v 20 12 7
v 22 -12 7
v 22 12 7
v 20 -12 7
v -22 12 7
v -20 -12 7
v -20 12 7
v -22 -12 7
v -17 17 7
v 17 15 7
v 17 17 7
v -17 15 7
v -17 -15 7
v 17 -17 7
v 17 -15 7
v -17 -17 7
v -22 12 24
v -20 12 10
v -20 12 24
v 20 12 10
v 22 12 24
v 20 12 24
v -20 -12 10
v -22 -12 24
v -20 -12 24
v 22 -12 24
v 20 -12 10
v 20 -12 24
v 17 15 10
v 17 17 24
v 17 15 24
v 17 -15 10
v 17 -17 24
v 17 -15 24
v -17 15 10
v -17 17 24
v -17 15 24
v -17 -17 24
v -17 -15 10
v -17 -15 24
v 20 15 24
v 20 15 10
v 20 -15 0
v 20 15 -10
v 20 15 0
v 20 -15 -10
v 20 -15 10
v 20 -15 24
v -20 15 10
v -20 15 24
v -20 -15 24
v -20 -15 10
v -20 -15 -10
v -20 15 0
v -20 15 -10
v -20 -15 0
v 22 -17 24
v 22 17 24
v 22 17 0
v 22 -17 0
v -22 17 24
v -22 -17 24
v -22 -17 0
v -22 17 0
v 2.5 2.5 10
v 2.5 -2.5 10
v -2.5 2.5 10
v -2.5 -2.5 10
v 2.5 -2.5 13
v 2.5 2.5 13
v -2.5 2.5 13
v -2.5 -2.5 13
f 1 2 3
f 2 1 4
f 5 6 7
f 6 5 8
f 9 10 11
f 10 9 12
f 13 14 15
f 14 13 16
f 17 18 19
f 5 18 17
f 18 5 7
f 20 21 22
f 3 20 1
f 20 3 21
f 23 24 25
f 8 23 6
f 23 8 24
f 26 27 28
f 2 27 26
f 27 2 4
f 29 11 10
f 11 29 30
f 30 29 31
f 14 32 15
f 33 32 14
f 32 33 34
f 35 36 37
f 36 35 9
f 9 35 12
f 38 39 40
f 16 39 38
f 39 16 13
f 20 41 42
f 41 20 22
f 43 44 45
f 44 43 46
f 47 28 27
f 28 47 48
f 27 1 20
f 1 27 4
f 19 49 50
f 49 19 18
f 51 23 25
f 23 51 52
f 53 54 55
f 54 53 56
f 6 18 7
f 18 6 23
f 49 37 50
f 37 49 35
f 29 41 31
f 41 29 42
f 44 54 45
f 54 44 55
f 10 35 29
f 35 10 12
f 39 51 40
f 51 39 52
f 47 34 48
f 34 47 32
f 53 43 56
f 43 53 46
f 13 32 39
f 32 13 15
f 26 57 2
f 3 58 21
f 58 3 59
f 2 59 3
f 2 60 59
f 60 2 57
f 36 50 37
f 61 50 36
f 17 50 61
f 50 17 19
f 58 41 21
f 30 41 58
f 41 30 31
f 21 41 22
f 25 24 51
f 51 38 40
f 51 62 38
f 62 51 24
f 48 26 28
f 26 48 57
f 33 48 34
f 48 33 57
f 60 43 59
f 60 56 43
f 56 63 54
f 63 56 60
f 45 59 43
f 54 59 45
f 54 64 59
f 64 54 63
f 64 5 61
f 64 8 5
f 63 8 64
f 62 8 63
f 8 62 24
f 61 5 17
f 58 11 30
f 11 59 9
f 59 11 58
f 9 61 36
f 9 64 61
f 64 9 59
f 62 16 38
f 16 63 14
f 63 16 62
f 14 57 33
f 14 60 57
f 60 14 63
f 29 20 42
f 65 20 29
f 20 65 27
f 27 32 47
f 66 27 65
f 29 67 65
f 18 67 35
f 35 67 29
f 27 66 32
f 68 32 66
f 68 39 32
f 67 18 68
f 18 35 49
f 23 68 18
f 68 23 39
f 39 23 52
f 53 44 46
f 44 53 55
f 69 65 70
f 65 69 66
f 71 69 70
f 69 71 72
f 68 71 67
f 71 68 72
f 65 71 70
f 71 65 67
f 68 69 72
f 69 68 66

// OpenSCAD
// file: centered_geometry.scad
module ccube(size, center=[1,1,1]) {
    trans = [
        size[0] * center[0] / 2,
        size[1] * center[1] / 2,
        size[2] * center[2] / 2,
    ];
    translate(trans) cube(size, true);
}
// file: servo.scad
use <centered_geometry.scad>;

module servo(size, gear_size, gear_pos=[0,0]) {
    cube(size, true);
    height = (gear_size[2] + size[2]) / 2;
    translate(concat(gear_pos,[height])) {
        cube(gear_size, true);
    }
}

module servo_holder(
    servo,
    thickness,
    base_height,
    corner_width,
    center
) {
    servo_diff = [
        servo[0],
        servo[1],
        servo[2]*2
    ];
    holder = [
        servo[0] + thickness[0]*2,
        servo[1] + thickness[1]*2,
        servo[2] + thickness[2]*2    
    ];
    echo("holder: ", holder);
    xdiff = [
        holder[0] * 2,
        holder[1] - 2*corner_width,
        holder[2]
    ];
    echo("xdiff: ", xdiff);
    ydiff = [
        holder[0] - 2*corner_width,
        holder[1] * 2,
        holder[2]
    ];
    echo("ydiff: ", ydiff);
    echo("servo_diff: ", servo_diff);
    difference() {
        ccube(holder, [0,0,1]);
        translate([0,0,thickness[2]]) {
            ccube(servo_diff, [0,0,1]);
            translate([0,0,base_height]) {
                ccube(xdiff, [0,0,1]);
                ccube(ydiff, [0,0,1]);
            }
        }
    }
}
// main file
use <servo.scad>;
use <centered_geometry.scad>;

//translate([10, 0, 0]) ccube([10, 10, 10], [0, 0, 1]);

servo = [40, 30, 20];
color("red") servo_holder(
    servo,
    [2, 2, 2],
    5,
    5,
    0
);

color("green") rotate([0,0,0]) servo(servo, [5,5,3]);
